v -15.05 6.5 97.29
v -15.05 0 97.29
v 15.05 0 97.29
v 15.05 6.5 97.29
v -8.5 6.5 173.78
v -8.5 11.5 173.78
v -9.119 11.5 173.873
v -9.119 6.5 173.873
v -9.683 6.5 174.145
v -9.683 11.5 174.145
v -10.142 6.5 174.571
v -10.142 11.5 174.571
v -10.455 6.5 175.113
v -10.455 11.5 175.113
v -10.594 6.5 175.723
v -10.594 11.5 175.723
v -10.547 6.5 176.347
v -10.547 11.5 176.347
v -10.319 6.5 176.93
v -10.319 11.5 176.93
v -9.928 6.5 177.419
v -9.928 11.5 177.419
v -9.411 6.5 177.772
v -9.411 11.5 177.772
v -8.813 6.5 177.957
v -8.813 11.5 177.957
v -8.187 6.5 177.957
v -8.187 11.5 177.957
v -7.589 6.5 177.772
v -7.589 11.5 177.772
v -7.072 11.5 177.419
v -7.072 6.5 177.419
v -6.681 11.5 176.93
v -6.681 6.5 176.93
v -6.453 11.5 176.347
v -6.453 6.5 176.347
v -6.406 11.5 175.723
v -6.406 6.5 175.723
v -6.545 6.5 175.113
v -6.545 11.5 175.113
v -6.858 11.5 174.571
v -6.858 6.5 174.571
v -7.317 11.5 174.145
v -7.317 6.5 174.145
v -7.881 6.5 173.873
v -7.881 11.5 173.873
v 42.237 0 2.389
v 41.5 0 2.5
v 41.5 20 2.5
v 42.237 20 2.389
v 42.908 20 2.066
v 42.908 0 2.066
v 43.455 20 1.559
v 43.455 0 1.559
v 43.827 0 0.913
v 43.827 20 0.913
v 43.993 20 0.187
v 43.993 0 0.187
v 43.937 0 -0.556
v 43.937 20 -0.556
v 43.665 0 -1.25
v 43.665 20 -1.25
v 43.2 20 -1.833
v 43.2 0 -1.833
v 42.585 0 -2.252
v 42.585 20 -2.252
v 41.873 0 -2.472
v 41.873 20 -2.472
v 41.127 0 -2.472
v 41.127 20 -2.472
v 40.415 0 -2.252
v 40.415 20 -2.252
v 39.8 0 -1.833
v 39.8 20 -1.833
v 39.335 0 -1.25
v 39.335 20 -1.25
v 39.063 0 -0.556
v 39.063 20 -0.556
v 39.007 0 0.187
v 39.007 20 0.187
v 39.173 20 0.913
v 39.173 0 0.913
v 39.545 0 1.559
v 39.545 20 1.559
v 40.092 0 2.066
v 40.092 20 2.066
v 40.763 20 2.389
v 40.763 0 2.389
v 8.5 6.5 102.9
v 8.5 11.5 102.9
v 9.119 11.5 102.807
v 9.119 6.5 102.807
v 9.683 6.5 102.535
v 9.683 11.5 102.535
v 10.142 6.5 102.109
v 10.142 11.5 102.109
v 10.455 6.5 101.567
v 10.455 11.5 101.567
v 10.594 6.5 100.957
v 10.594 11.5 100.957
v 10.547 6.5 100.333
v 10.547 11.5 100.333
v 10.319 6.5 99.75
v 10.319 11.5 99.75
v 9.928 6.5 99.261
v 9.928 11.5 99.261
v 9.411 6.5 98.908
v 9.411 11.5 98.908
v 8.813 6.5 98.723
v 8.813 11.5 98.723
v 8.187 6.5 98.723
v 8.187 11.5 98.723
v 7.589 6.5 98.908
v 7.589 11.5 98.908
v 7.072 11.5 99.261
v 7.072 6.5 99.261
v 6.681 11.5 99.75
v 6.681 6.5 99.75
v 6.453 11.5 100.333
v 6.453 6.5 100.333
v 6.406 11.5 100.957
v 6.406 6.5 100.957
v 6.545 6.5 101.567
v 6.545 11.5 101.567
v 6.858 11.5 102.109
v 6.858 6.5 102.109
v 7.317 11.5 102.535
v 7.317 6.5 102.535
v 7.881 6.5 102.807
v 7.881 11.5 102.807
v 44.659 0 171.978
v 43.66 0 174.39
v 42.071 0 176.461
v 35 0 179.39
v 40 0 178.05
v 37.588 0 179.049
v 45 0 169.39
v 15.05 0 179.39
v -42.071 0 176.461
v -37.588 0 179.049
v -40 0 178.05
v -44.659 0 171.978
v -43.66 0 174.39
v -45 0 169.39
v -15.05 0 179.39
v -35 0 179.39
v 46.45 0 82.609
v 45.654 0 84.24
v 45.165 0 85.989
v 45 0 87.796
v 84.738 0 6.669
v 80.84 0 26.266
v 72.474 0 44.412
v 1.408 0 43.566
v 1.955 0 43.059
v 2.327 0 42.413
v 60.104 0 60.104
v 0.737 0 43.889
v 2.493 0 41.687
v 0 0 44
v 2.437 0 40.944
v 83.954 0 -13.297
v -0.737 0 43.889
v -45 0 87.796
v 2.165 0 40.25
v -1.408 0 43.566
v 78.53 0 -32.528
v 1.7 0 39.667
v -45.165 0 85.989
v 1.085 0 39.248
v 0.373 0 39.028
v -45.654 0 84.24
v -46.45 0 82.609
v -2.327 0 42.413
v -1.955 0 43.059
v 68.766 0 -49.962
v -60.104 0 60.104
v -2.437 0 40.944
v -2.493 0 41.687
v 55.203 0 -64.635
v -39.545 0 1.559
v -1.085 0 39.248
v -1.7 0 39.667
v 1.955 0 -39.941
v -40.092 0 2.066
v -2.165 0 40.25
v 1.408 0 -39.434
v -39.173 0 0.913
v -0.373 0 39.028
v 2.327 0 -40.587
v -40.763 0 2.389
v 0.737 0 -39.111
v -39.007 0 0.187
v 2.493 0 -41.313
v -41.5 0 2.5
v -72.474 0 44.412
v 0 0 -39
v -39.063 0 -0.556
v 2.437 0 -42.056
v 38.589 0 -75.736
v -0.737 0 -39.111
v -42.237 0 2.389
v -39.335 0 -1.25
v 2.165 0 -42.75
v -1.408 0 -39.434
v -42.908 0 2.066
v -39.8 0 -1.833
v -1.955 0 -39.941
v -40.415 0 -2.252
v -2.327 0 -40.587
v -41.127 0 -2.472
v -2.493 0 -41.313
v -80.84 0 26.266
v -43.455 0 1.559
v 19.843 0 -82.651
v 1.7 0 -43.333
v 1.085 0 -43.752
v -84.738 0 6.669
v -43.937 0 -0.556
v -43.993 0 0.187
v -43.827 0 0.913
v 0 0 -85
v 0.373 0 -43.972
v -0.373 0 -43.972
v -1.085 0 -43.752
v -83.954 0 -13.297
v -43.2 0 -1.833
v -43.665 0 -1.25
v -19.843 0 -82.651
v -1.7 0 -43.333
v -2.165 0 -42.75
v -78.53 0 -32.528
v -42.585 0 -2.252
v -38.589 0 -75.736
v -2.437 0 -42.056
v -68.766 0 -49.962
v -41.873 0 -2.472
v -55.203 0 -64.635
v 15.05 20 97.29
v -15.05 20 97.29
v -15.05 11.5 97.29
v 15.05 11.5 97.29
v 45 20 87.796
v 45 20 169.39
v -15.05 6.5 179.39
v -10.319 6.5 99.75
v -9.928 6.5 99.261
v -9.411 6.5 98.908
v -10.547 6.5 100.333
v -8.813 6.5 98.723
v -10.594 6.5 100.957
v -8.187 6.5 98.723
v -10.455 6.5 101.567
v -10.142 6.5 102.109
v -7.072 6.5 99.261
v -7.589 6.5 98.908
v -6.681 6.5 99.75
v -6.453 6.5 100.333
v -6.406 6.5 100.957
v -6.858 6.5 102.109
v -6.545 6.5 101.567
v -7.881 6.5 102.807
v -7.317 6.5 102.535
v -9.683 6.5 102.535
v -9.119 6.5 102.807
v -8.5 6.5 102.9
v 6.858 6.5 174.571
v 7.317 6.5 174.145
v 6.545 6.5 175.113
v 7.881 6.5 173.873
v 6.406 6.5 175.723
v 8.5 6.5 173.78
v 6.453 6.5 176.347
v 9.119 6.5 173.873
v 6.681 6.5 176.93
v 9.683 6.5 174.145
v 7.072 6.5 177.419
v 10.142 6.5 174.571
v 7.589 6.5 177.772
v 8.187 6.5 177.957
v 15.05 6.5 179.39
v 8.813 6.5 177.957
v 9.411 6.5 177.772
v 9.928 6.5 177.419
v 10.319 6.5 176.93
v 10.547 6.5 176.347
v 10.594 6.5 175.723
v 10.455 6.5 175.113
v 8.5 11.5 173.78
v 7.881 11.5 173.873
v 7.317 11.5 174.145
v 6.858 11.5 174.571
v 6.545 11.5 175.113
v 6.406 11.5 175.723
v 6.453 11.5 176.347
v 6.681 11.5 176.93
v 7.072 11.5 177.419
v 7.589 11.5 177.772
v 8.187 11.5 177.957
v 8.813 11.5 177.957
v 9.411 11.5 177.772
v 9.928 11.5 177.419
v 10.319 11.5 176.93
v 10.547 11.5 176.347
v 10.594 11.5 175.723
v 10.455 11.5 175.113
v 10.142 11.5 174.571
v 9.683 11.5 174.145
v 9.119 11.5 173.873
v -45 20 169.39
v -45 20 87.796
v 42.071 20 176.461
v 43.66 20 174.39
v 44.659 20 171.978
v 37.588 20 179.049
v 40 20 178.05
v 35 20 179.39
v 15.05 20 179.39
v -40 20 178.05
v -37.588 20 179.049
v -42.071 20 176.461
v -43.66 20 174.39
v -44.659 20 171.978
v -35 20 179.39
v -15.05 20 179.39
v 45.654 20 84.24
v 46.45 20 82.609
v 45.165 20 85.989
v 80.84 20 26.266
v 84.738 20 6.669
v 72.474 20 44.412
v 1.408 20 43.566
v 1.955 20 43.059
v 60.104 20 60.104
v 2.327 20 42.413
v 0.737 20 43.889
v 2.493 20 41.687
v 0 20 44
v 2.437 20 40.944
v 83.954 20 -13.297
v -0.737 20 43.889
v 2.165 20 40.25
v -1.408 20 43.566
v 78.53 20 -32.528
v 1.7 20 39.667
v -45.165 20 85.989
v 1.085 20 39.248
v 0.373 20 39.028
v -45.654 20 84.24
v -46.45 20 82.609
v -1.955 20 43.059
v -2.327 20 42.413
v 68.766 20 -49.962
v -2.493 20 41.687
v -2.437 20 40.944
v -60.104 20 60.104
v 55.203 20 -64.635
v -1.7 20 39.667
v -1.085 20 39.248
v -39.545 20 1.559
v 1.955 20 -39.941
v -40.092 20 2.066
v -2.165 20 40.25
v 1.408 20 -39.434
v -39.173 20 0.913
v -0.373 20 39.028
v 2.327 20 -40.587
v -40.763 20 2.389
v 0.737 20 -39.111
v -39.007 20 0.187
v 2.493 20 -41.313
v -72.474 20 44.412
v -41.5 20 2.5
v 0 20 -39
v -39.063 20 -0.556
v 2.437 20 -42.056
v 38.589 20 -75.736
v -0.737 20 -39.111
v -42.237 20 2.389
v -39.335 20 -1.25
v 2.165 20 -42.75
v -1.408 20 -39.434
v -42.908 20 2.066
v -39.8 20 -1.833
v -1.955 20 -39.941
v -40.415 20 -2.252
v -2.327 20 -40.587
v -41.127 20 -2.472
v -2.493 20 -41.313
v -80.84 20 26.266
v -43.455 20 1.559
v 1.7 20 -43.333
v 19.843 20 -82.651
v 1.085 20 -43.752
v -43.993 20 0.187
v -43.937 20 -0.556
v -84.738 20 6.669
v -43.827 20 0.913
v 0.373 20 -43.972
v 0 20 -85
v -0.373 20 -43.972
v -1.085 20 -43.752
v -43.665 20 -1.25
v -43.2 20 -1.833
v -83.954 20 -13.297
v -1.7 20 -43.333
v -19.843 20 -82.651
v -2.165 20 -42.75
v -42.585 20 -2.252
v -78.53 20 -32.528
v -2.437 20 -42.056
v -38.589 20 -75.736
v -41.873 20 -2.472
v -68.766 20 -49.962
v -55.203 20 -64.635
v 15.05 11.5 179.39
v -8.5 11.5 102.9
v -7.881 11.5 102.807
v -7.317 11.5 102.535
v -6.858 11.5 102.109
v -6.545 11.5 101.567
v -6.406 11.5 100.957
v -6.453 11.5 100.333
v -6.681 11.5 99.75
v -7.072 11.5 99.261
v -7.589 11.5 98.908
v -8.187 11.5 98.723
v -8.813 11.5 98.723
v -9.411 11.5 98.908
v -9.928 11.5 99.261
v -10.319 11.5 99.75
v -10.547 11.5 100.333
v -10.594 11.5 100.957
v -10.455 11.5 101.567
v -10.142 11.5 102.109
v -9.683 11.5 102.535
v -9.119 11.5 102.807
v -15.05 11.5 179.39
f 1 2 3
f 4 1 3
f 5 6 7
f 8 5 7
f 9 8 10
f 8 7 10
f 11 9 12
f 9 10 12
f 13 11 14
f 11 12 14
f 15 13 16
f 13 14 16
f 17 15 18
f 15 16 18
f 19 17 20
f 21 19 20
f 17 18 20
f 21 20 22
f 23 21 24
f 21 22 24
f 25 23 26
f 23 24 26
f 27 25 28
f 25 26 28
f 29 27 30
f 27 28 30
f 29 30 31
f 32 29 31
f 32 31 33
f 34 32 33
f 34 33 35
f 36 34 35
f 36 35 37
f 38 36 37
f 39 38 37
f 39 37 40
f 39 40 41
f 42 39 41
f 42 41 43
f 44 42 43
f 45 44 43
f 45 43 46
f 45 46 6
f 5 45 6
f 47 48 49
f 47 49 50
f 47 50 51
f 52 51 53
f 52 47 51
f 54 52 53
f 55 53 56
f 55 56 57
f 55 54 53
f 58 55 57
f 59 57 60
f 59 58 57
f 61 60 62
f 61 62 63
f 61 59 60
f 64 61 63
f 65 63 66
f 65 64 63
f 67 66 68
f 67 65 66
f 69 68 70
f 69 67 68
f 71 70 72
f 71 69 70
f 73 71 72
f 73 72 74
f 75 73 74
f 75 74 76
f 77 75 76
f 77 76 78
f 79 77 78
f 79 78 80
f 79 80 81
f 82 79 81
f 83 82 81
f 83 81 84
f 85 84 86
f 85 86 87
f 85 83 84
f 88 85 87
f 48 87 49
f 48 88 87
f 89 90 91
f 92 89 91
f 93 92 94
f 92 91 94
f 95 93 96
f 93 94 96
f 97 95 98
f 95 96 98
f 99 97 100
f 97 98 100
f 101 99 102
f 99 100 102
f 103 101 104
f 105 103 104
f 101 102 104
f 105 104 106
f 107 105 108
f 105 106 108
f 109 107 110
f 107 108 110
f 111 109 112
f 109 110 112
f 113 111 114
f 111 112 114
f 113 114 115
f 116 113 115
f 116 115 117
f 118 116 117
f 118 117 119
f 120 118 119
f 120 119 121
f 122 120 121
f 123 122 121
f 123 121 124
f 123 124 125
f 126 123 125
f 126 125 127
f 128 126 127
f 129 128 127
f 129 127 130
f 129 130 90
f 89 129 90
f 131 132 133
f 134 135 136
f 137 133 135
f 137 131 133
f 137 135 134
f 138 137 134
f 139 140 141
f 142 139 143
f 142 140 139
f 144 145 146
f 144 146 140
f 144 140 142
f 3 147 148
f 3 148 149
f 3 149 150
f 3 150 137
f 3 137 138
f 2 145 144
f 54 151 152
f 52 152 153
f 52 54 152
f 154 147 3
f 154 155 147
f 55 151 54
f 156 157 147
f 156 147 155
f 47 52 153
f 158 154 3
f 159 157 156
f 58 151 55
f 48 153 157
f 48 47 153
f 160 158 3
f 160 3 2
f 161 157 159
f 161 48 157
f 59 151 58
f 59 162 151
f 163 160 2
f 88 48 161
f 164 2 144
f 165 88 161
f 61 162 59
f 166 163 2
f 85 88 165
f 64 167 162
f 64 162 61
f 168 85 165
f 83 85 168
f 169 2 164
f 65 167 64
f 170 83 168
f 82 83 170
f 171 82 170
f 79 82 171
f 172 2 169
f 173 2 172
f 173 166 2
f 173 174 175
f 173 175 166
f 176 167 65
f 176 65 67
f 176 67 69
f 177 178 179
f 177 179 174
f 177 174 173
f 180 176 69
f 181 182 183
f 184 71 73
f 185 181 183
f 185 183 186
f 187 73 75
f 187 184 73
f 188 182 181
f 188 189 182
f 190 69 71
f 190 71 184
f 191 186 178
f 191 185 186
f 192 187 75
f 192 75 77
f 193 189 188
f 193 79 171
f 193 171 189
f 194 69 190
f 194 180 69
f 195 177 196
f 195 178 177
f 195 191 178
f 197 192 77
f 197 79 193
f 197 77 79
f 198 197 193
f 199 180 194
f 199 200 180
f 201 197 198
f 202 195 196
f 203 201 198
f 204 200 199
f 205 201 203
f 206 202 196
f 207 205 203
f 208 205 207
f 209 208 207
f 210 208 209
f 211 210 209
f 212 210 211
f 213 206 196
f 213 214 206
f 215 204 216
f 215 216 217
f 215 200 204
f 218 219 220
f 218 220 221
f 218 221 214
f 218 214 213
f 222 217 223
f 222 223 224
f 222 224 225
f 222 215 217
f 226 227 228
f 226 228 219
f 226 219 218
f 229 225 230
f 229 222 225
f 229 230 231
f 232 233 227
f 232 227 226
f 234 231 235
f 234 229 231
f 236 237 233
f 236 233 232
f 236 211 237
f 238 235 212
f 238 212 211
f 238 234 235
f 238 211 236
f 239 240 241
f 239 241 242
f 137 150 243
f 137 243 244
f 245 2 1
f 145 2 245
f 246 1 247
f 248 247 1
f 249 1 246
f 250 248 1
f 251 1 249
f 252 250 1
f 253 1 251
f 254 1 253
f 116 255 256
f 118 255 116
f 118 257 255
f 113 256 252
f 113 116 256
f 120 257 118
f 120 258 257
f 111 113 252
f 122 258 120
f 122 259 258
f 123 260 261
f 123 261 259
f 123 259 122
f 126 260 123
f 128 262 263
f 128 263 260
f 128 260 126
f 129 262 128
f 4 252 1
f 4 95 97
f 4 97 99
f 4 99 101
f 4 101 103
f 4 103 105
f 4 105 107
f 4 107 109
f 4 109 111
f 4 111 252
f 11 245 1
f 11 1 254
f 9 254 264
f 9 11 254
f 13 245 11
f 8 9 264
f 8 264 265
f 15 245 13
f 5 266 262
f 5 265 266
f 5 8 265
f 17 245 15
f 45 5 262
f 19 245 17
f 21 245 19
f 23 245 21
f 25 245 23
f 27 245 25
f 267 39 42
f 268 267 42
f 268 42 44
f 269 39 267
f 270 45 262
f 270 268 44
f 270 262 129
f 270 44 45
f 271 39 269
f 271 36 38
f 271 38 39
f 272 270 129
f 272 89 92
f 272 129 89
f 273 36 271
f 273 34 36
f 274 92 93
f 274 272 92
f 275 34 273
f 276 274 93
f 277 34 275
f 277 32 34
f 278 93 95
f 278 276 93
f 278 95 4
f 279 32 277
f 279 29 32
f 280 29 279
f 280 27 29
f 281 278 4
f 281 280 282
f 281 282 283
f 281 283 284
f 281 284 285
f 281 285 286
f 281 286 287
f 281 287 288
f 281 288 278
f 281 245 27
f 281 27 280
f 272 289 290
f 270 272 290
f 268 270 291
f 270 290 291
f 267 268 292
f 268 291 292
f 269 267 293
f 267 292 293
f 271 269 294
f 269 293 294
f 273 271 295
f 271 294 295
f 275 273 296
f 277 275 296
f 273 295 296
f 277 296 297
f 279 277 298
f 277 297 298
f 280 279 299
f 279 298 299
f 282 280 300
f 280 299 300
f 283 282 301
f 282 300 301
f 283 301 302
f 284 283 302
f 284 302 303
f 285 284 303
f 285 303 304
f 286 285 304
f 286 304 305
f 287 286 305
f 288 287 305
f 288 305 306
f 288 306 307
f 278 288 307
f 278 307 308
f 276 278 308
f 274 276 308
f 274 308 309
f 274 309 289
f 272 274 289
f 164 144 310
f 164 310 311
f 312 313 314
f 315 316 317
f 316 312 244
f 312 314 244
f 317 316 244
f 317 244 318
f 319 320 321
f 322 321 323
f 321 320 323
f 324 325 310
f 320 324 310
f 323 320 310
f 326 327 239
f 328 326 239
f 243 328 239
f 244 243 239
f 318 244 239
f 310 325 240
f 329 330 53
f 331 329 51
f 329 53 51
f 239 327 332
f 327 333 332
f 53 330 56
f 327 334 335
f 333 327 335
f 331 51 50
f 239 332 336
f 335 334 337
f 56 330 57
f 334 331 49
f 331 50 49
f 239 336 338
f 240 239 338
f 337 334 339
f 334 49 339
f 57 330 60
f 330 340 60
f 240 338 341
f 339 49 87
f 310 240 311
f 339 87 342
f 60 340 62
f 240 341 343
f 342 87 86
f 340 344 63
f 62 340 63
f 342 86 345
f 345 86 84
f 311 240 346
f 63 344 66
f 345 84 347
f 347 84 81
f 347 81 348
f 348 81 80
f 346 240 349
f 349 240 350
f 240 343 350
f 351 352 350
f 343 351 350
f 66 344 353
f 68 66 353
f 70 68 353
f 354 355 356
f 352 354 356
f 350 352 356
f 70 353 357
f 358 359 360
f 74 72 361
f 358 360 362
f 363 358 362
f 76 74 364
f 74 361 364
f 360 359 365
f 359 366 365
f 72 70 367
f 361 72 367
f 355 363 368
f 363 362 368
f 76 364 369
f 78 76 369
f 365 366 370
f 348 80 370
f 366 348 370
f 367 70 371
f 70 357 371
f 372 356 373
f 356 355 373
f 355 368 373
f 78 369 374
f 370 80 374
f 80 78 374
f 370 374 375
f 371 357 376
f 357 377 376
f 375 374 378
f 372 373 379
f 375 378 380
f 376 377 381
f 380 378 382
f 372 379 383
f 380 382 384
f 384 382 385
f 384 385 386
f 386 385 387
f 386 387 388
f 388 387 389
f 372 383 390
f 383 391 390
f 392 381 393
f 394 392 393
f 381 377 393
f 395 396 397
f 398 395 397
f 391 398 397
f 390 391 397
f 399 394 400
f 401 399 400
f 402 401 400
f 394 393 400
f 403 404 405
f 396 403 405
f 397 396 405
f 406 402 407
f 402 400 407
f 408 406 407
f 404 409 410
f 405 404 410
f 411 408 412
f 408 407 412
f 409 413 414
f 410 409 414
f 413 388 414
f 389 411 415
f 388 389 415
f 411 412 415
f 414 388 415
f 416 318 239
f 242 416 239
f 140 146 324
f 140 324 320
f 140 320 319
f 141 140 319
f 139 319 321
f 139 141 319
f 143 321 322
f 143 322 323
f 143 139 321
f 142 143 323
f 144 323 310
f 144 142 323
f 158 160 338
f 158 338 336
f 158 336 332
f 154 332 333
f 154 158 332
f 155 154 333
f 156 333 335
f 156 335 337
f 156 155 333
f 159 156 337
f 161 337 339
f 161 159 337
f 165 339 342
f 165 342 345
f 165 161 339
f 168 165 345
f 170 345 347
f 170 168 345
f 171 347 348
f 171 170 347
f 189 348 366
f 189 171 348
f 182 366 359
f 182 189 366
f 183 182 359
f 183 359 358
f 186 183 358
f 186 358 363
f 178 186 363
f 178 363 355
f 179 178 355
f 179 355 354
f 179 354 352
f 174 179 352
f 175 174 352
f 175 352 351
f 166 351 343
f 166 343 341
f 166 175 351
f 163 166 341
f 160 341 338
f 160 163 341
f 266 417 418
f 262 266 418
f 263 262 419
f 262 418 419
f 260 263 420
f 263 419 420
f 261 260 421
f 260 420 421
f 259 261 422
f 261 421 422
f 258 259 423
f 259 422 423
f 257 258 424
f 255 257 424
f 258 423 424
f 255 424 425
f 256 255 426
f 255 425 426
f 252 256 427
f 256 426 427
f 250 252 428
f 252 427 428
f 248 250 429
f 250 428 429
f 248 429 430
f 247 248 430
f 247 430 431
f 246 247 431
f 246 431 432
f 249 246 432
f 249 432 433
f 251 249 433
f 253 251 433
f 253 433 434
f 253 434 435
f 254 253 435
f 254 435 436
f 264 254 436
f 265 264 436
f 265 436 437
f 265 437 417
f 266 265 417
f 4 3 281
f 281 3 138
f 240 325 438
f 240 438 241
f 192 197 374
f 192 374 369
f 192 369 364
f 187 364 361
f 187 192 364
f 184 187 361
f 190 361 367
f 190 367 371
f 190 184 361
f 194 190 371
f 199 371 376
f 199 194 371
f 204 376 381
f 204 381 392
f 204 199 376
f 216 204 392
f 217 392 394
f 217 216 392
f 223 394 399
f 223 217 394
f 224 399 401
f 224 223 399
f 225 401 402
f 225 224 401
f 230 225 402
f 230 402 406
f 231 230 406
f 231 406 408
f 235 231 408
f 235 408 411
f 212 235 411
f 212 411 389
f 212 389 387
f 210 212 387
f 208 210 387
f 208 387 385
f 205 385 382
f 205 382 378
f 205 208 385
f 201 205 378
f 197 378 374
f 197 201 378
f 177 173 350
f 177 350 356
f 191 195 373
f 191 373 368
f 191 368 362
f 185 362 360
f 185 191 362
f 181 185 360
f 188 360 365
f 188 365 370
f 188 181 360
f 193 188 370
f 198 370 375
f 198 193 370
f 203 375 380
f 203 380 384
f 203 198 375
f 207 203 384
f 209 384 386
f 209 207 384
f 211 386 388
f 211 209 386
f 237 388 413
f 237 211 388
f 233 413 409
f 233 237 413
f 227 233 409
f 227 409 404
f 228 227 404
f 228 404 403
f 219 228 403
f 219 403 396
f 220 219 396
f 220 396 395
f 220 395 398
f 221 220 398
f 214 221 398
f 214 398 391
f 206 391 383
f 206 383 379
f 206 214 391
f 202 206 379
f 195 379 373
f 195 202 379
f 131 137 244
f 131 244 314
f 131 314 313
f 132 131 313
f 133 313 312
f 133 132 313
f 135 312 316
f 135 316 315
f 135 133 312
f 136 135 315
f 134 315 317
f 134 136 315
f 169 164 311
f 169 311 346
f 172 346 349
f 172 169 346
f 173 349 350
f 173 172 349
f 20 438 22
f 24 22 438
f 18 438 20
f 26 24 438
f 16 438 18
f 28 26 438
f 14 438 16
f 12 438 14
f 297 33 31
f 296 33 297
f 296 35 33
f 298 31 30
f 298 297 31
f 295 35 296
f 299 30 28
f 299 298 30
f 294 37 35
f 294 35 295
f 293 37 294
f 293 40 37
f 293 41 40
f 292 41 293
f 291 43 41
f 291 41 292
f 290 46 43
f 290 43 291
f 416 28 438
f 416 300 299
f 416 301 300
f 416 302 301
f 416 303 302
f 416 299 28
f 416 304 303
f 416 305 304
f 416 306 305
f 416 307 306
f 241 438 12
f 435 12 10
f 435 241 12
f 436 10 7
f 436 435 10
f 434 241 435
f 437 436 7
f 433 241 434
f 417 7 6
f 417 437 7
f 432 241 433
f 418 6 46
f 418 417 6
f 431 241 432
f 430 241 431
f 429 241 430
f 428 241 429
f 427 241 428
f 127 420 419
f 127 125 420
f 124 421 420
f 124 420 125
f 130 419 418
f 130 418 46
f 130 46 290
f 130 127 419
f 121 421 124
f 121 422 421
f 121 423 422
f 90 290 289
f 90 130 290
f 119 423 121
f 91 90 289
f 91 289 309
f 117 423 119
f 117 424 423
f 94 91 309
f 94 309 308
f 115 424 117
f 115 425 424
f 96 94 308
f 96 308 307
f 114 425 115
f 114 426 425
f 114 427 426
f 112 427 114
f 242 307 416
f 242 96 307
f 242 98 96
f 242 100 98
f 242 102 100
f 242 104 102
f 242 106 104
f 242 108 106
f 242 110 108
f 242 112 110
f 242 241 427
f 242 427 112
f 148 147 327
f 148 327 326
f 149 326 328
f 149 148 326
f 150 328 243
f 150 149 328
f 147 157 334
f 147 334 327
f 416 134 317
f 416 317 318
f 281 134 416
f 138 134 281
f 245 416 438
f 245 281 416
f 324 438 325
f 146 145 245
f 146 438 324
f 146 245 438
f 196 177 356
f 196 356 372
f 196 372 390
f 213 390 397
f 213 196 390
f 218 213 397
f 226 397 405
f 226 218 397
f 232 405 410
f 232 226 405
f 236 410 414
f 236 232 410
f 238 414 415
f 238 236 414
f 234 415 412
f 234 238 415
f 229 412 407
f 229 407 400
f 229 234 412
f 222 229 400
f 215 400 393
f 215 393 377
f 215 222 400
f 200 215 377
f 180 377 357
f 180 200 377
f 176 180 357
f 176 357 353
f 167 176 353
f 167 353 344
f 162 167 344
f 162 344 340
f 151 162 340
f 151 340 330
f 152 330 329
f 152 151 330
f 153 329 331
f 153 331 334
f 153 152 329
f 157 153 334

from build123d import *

# Parameters (mm, degrees)
SKETCH1_R           = 2.5
BOSS_EXTRUDE1_DEPTH = 20
SKETCH2_W           = 30.1
SKETCH2_H           = 82.1
CUT_EXTRUDE1_DEPTH  = 8.5
SKETCH3_W           = 30.1
SKETCH3_H           = 82.1
CUT_EXTRUDE2_DEPTH  = 6.5
CUT_EXTRUDE3_REACH  = 200.842
SKETCH5_R           = 2.1


with BuildPart() as part:
    # Sketch1 → Boss-Extrude1 (new body)
    with BuildSketch(Plane(origin=(0, 0, 0), x_dir=(1, 0, 0), z_dir=(0, 1, 0))):
        with BuildLine():
            Line((60.104076401, -60.104076401), (46.450402953, -82.609312867))
            ThreePointArc((46.450402953, -82.609312867), (45.36942446, -85.103300576), (45, -87.796257086))
            Line((45, -87.796257086), (45, -118.89))
            Line((45, -118.89), (45, -169.39))
            ThreePointArc((45, -169.39), (42.071067812, -176.461067812), (35, -179.39))
            Line((35, -179.39), (-35, -179.39))
            ThreePointArc((-35, -179.39), (-42.071067812, -176.461067812), (-45, -169.39))
            Line((-45, -169.39), (-45, -118.89))
            Line((-45, -118.89), (-45, -87.796257086))
            ThreePointArc((-45, -87.796257086), (-45.36942446, -85.103300576), (-46.450402953, -82.609312867))
            Line((-46.450402953, -82.609312867), (-60.104076401, -60.104076401))
            ThreePointArc((-60.104076401, -60.104076401), (0, 85), (60.104076401, -60.104076401))
        make_face()
        with Locations(Location((0, 41.5, 0), (0, 0, 270))):
            Circle(SKETCH1_R, mode=Mode.SUBTRACT)
        with Locations(Location((41.5, 0, 0), (0, 0, 270))):
            Circle(SKETCH1_R, mode=Mode.SUBTRACT)
        with Locations(Location((0, -41.5, 0), (0, 0, 270))):
            Circle(SKETCH1_R, mode=Mode.SUBTRACT)
        with Locations(Location((-41.5, 0, 0), (0, 0, 270))):
            Circle(SKETCH1_R, mode=Mode.SUBTRACT)
    extrude(amount=BOSS_EXTRUDE1_DEPTH)

    # Sketch2 → Cut-Extrude1 (cut)
    with BuildSketch(Plane(origin=(0, 20, 0), x_dir=(1, 0, 0), z_dir=(0, 1, 0))):
        with Locations((0, -138.34)):
            Rectangle(SKETCH2_W, SKETCH2_H)
    extrude(amount=-CUT_EXTRUDE1_DEPTH, mode=Mode.SUBTRACT)

    # Sketch3 → Cut-Extrude2 (cut)
    with BuildSketch(Plane.XZ):
        with Locations((0, 138.34)):
            Rectangle(SKETCH3_W, SKETCH3_H)
    extrude(amount=-CUT_EXTRUDE2_DEPTH, mode=Mode.SUBTRACT)

    # Sketch5 → Cut-Extrude3 (cut, up to next)
    with BuildSketch(Plane(origin=(0, 11.5, 0), x_dir=(1, 0, 0), z_dir=(0, 1, 0)), mode=Mode.PRIVATE) as cut_extrude3_sk1:
        with Locations(Location((-8.5, -100.8, 0), (0, 0, 270))):
            Circle(SKETCH5_R)
    cut_extrude3_tool1 = extrude(cut_extrude3_sk1.sketch, amount=-CUT_EXTRUDE3_REACH, mode=Mode.PRIVATE) & part.part
    # Sketch5 → Cut-Extrude3 (cut, up to next)
    with BuildSketch(Plane(origin=(0, 11.5, 0), x_dir=(1, 0, 0), z_dir=(0, 1, 0)), mode=Mode.PRIVATE) as cut_extrude3_sk2:
        with Locations(Location((8.5, -100.8, 0), (0, 0, 270))):
            Circle(SKETCH5_R)
    cut_extrude3_tool2 = extrude(cut_extrude3_sk2.sketch, amount=-CUT_EXTRUDE3_REACH, mode=Mode.PRIVATE) & part.part
    # Sketch5 → Cut-Extrude3 (cut, up to next)
    with BuildSketch(Plane(origin=(0, 11.5, 0), x_dir=(1, 0, 0), z_dir=(0, 1, 0)), mode=Mode.PRIVATE) as cut_extrude3_sk3:
        with Locations(Location((8.5, -175.88, 0), (0, 0, 90))):
            Circle(SKETCH5_R)
    cut_extrude3_tool3 = extrude(cut_extrude3_sk3.sketch, amount=-CUT_EXTRUDE3_REACH, mode=Mode.PRIVATE) & part.part
    # Sketch5 → Cut-Extrude3 (cut, up to next)
    with BuildSketch(Plane(origin=(0, 11.5, 0), x_dir=(1, 0, 0), z_dir=(0, 1, 0)), mode=Mode.PRIVATE) as cut_extrude3_sk4:
        with Locations(Location((-8.5, -175.88, 0), (0, 0, 90))):
            Circle(SKETCH5_R)
    cut_extrude3_tool4 = extrude(cut_extrude3_sk4.sketch, amount=-CUT_EXTRUDE3_REACH, mode=Mode.PRIVATE) & part.part
    add(cut_extrude3_tool1.solids().sort_by_distance((-8.5, 11.5, 100.8))[0], mode=Mode.SUBTRACT)
    add(cut_extrude3_tool2.solids().sort_by_distance((8.5, 11.5, 100.8))[0], mode=Mode.SUBTRACT)
    add(cut_extrude3_tool3.solids().sort_by_distance((8.5, 11.5, 175.88))[0], mode=Mode.SUBTRACT)
    add(cut_extrude3_tool4.solids().sort_by_distance((-8.5, 11.5, 175.88))[0], mode=Mode.SUBTRACT)


solid = part.part
